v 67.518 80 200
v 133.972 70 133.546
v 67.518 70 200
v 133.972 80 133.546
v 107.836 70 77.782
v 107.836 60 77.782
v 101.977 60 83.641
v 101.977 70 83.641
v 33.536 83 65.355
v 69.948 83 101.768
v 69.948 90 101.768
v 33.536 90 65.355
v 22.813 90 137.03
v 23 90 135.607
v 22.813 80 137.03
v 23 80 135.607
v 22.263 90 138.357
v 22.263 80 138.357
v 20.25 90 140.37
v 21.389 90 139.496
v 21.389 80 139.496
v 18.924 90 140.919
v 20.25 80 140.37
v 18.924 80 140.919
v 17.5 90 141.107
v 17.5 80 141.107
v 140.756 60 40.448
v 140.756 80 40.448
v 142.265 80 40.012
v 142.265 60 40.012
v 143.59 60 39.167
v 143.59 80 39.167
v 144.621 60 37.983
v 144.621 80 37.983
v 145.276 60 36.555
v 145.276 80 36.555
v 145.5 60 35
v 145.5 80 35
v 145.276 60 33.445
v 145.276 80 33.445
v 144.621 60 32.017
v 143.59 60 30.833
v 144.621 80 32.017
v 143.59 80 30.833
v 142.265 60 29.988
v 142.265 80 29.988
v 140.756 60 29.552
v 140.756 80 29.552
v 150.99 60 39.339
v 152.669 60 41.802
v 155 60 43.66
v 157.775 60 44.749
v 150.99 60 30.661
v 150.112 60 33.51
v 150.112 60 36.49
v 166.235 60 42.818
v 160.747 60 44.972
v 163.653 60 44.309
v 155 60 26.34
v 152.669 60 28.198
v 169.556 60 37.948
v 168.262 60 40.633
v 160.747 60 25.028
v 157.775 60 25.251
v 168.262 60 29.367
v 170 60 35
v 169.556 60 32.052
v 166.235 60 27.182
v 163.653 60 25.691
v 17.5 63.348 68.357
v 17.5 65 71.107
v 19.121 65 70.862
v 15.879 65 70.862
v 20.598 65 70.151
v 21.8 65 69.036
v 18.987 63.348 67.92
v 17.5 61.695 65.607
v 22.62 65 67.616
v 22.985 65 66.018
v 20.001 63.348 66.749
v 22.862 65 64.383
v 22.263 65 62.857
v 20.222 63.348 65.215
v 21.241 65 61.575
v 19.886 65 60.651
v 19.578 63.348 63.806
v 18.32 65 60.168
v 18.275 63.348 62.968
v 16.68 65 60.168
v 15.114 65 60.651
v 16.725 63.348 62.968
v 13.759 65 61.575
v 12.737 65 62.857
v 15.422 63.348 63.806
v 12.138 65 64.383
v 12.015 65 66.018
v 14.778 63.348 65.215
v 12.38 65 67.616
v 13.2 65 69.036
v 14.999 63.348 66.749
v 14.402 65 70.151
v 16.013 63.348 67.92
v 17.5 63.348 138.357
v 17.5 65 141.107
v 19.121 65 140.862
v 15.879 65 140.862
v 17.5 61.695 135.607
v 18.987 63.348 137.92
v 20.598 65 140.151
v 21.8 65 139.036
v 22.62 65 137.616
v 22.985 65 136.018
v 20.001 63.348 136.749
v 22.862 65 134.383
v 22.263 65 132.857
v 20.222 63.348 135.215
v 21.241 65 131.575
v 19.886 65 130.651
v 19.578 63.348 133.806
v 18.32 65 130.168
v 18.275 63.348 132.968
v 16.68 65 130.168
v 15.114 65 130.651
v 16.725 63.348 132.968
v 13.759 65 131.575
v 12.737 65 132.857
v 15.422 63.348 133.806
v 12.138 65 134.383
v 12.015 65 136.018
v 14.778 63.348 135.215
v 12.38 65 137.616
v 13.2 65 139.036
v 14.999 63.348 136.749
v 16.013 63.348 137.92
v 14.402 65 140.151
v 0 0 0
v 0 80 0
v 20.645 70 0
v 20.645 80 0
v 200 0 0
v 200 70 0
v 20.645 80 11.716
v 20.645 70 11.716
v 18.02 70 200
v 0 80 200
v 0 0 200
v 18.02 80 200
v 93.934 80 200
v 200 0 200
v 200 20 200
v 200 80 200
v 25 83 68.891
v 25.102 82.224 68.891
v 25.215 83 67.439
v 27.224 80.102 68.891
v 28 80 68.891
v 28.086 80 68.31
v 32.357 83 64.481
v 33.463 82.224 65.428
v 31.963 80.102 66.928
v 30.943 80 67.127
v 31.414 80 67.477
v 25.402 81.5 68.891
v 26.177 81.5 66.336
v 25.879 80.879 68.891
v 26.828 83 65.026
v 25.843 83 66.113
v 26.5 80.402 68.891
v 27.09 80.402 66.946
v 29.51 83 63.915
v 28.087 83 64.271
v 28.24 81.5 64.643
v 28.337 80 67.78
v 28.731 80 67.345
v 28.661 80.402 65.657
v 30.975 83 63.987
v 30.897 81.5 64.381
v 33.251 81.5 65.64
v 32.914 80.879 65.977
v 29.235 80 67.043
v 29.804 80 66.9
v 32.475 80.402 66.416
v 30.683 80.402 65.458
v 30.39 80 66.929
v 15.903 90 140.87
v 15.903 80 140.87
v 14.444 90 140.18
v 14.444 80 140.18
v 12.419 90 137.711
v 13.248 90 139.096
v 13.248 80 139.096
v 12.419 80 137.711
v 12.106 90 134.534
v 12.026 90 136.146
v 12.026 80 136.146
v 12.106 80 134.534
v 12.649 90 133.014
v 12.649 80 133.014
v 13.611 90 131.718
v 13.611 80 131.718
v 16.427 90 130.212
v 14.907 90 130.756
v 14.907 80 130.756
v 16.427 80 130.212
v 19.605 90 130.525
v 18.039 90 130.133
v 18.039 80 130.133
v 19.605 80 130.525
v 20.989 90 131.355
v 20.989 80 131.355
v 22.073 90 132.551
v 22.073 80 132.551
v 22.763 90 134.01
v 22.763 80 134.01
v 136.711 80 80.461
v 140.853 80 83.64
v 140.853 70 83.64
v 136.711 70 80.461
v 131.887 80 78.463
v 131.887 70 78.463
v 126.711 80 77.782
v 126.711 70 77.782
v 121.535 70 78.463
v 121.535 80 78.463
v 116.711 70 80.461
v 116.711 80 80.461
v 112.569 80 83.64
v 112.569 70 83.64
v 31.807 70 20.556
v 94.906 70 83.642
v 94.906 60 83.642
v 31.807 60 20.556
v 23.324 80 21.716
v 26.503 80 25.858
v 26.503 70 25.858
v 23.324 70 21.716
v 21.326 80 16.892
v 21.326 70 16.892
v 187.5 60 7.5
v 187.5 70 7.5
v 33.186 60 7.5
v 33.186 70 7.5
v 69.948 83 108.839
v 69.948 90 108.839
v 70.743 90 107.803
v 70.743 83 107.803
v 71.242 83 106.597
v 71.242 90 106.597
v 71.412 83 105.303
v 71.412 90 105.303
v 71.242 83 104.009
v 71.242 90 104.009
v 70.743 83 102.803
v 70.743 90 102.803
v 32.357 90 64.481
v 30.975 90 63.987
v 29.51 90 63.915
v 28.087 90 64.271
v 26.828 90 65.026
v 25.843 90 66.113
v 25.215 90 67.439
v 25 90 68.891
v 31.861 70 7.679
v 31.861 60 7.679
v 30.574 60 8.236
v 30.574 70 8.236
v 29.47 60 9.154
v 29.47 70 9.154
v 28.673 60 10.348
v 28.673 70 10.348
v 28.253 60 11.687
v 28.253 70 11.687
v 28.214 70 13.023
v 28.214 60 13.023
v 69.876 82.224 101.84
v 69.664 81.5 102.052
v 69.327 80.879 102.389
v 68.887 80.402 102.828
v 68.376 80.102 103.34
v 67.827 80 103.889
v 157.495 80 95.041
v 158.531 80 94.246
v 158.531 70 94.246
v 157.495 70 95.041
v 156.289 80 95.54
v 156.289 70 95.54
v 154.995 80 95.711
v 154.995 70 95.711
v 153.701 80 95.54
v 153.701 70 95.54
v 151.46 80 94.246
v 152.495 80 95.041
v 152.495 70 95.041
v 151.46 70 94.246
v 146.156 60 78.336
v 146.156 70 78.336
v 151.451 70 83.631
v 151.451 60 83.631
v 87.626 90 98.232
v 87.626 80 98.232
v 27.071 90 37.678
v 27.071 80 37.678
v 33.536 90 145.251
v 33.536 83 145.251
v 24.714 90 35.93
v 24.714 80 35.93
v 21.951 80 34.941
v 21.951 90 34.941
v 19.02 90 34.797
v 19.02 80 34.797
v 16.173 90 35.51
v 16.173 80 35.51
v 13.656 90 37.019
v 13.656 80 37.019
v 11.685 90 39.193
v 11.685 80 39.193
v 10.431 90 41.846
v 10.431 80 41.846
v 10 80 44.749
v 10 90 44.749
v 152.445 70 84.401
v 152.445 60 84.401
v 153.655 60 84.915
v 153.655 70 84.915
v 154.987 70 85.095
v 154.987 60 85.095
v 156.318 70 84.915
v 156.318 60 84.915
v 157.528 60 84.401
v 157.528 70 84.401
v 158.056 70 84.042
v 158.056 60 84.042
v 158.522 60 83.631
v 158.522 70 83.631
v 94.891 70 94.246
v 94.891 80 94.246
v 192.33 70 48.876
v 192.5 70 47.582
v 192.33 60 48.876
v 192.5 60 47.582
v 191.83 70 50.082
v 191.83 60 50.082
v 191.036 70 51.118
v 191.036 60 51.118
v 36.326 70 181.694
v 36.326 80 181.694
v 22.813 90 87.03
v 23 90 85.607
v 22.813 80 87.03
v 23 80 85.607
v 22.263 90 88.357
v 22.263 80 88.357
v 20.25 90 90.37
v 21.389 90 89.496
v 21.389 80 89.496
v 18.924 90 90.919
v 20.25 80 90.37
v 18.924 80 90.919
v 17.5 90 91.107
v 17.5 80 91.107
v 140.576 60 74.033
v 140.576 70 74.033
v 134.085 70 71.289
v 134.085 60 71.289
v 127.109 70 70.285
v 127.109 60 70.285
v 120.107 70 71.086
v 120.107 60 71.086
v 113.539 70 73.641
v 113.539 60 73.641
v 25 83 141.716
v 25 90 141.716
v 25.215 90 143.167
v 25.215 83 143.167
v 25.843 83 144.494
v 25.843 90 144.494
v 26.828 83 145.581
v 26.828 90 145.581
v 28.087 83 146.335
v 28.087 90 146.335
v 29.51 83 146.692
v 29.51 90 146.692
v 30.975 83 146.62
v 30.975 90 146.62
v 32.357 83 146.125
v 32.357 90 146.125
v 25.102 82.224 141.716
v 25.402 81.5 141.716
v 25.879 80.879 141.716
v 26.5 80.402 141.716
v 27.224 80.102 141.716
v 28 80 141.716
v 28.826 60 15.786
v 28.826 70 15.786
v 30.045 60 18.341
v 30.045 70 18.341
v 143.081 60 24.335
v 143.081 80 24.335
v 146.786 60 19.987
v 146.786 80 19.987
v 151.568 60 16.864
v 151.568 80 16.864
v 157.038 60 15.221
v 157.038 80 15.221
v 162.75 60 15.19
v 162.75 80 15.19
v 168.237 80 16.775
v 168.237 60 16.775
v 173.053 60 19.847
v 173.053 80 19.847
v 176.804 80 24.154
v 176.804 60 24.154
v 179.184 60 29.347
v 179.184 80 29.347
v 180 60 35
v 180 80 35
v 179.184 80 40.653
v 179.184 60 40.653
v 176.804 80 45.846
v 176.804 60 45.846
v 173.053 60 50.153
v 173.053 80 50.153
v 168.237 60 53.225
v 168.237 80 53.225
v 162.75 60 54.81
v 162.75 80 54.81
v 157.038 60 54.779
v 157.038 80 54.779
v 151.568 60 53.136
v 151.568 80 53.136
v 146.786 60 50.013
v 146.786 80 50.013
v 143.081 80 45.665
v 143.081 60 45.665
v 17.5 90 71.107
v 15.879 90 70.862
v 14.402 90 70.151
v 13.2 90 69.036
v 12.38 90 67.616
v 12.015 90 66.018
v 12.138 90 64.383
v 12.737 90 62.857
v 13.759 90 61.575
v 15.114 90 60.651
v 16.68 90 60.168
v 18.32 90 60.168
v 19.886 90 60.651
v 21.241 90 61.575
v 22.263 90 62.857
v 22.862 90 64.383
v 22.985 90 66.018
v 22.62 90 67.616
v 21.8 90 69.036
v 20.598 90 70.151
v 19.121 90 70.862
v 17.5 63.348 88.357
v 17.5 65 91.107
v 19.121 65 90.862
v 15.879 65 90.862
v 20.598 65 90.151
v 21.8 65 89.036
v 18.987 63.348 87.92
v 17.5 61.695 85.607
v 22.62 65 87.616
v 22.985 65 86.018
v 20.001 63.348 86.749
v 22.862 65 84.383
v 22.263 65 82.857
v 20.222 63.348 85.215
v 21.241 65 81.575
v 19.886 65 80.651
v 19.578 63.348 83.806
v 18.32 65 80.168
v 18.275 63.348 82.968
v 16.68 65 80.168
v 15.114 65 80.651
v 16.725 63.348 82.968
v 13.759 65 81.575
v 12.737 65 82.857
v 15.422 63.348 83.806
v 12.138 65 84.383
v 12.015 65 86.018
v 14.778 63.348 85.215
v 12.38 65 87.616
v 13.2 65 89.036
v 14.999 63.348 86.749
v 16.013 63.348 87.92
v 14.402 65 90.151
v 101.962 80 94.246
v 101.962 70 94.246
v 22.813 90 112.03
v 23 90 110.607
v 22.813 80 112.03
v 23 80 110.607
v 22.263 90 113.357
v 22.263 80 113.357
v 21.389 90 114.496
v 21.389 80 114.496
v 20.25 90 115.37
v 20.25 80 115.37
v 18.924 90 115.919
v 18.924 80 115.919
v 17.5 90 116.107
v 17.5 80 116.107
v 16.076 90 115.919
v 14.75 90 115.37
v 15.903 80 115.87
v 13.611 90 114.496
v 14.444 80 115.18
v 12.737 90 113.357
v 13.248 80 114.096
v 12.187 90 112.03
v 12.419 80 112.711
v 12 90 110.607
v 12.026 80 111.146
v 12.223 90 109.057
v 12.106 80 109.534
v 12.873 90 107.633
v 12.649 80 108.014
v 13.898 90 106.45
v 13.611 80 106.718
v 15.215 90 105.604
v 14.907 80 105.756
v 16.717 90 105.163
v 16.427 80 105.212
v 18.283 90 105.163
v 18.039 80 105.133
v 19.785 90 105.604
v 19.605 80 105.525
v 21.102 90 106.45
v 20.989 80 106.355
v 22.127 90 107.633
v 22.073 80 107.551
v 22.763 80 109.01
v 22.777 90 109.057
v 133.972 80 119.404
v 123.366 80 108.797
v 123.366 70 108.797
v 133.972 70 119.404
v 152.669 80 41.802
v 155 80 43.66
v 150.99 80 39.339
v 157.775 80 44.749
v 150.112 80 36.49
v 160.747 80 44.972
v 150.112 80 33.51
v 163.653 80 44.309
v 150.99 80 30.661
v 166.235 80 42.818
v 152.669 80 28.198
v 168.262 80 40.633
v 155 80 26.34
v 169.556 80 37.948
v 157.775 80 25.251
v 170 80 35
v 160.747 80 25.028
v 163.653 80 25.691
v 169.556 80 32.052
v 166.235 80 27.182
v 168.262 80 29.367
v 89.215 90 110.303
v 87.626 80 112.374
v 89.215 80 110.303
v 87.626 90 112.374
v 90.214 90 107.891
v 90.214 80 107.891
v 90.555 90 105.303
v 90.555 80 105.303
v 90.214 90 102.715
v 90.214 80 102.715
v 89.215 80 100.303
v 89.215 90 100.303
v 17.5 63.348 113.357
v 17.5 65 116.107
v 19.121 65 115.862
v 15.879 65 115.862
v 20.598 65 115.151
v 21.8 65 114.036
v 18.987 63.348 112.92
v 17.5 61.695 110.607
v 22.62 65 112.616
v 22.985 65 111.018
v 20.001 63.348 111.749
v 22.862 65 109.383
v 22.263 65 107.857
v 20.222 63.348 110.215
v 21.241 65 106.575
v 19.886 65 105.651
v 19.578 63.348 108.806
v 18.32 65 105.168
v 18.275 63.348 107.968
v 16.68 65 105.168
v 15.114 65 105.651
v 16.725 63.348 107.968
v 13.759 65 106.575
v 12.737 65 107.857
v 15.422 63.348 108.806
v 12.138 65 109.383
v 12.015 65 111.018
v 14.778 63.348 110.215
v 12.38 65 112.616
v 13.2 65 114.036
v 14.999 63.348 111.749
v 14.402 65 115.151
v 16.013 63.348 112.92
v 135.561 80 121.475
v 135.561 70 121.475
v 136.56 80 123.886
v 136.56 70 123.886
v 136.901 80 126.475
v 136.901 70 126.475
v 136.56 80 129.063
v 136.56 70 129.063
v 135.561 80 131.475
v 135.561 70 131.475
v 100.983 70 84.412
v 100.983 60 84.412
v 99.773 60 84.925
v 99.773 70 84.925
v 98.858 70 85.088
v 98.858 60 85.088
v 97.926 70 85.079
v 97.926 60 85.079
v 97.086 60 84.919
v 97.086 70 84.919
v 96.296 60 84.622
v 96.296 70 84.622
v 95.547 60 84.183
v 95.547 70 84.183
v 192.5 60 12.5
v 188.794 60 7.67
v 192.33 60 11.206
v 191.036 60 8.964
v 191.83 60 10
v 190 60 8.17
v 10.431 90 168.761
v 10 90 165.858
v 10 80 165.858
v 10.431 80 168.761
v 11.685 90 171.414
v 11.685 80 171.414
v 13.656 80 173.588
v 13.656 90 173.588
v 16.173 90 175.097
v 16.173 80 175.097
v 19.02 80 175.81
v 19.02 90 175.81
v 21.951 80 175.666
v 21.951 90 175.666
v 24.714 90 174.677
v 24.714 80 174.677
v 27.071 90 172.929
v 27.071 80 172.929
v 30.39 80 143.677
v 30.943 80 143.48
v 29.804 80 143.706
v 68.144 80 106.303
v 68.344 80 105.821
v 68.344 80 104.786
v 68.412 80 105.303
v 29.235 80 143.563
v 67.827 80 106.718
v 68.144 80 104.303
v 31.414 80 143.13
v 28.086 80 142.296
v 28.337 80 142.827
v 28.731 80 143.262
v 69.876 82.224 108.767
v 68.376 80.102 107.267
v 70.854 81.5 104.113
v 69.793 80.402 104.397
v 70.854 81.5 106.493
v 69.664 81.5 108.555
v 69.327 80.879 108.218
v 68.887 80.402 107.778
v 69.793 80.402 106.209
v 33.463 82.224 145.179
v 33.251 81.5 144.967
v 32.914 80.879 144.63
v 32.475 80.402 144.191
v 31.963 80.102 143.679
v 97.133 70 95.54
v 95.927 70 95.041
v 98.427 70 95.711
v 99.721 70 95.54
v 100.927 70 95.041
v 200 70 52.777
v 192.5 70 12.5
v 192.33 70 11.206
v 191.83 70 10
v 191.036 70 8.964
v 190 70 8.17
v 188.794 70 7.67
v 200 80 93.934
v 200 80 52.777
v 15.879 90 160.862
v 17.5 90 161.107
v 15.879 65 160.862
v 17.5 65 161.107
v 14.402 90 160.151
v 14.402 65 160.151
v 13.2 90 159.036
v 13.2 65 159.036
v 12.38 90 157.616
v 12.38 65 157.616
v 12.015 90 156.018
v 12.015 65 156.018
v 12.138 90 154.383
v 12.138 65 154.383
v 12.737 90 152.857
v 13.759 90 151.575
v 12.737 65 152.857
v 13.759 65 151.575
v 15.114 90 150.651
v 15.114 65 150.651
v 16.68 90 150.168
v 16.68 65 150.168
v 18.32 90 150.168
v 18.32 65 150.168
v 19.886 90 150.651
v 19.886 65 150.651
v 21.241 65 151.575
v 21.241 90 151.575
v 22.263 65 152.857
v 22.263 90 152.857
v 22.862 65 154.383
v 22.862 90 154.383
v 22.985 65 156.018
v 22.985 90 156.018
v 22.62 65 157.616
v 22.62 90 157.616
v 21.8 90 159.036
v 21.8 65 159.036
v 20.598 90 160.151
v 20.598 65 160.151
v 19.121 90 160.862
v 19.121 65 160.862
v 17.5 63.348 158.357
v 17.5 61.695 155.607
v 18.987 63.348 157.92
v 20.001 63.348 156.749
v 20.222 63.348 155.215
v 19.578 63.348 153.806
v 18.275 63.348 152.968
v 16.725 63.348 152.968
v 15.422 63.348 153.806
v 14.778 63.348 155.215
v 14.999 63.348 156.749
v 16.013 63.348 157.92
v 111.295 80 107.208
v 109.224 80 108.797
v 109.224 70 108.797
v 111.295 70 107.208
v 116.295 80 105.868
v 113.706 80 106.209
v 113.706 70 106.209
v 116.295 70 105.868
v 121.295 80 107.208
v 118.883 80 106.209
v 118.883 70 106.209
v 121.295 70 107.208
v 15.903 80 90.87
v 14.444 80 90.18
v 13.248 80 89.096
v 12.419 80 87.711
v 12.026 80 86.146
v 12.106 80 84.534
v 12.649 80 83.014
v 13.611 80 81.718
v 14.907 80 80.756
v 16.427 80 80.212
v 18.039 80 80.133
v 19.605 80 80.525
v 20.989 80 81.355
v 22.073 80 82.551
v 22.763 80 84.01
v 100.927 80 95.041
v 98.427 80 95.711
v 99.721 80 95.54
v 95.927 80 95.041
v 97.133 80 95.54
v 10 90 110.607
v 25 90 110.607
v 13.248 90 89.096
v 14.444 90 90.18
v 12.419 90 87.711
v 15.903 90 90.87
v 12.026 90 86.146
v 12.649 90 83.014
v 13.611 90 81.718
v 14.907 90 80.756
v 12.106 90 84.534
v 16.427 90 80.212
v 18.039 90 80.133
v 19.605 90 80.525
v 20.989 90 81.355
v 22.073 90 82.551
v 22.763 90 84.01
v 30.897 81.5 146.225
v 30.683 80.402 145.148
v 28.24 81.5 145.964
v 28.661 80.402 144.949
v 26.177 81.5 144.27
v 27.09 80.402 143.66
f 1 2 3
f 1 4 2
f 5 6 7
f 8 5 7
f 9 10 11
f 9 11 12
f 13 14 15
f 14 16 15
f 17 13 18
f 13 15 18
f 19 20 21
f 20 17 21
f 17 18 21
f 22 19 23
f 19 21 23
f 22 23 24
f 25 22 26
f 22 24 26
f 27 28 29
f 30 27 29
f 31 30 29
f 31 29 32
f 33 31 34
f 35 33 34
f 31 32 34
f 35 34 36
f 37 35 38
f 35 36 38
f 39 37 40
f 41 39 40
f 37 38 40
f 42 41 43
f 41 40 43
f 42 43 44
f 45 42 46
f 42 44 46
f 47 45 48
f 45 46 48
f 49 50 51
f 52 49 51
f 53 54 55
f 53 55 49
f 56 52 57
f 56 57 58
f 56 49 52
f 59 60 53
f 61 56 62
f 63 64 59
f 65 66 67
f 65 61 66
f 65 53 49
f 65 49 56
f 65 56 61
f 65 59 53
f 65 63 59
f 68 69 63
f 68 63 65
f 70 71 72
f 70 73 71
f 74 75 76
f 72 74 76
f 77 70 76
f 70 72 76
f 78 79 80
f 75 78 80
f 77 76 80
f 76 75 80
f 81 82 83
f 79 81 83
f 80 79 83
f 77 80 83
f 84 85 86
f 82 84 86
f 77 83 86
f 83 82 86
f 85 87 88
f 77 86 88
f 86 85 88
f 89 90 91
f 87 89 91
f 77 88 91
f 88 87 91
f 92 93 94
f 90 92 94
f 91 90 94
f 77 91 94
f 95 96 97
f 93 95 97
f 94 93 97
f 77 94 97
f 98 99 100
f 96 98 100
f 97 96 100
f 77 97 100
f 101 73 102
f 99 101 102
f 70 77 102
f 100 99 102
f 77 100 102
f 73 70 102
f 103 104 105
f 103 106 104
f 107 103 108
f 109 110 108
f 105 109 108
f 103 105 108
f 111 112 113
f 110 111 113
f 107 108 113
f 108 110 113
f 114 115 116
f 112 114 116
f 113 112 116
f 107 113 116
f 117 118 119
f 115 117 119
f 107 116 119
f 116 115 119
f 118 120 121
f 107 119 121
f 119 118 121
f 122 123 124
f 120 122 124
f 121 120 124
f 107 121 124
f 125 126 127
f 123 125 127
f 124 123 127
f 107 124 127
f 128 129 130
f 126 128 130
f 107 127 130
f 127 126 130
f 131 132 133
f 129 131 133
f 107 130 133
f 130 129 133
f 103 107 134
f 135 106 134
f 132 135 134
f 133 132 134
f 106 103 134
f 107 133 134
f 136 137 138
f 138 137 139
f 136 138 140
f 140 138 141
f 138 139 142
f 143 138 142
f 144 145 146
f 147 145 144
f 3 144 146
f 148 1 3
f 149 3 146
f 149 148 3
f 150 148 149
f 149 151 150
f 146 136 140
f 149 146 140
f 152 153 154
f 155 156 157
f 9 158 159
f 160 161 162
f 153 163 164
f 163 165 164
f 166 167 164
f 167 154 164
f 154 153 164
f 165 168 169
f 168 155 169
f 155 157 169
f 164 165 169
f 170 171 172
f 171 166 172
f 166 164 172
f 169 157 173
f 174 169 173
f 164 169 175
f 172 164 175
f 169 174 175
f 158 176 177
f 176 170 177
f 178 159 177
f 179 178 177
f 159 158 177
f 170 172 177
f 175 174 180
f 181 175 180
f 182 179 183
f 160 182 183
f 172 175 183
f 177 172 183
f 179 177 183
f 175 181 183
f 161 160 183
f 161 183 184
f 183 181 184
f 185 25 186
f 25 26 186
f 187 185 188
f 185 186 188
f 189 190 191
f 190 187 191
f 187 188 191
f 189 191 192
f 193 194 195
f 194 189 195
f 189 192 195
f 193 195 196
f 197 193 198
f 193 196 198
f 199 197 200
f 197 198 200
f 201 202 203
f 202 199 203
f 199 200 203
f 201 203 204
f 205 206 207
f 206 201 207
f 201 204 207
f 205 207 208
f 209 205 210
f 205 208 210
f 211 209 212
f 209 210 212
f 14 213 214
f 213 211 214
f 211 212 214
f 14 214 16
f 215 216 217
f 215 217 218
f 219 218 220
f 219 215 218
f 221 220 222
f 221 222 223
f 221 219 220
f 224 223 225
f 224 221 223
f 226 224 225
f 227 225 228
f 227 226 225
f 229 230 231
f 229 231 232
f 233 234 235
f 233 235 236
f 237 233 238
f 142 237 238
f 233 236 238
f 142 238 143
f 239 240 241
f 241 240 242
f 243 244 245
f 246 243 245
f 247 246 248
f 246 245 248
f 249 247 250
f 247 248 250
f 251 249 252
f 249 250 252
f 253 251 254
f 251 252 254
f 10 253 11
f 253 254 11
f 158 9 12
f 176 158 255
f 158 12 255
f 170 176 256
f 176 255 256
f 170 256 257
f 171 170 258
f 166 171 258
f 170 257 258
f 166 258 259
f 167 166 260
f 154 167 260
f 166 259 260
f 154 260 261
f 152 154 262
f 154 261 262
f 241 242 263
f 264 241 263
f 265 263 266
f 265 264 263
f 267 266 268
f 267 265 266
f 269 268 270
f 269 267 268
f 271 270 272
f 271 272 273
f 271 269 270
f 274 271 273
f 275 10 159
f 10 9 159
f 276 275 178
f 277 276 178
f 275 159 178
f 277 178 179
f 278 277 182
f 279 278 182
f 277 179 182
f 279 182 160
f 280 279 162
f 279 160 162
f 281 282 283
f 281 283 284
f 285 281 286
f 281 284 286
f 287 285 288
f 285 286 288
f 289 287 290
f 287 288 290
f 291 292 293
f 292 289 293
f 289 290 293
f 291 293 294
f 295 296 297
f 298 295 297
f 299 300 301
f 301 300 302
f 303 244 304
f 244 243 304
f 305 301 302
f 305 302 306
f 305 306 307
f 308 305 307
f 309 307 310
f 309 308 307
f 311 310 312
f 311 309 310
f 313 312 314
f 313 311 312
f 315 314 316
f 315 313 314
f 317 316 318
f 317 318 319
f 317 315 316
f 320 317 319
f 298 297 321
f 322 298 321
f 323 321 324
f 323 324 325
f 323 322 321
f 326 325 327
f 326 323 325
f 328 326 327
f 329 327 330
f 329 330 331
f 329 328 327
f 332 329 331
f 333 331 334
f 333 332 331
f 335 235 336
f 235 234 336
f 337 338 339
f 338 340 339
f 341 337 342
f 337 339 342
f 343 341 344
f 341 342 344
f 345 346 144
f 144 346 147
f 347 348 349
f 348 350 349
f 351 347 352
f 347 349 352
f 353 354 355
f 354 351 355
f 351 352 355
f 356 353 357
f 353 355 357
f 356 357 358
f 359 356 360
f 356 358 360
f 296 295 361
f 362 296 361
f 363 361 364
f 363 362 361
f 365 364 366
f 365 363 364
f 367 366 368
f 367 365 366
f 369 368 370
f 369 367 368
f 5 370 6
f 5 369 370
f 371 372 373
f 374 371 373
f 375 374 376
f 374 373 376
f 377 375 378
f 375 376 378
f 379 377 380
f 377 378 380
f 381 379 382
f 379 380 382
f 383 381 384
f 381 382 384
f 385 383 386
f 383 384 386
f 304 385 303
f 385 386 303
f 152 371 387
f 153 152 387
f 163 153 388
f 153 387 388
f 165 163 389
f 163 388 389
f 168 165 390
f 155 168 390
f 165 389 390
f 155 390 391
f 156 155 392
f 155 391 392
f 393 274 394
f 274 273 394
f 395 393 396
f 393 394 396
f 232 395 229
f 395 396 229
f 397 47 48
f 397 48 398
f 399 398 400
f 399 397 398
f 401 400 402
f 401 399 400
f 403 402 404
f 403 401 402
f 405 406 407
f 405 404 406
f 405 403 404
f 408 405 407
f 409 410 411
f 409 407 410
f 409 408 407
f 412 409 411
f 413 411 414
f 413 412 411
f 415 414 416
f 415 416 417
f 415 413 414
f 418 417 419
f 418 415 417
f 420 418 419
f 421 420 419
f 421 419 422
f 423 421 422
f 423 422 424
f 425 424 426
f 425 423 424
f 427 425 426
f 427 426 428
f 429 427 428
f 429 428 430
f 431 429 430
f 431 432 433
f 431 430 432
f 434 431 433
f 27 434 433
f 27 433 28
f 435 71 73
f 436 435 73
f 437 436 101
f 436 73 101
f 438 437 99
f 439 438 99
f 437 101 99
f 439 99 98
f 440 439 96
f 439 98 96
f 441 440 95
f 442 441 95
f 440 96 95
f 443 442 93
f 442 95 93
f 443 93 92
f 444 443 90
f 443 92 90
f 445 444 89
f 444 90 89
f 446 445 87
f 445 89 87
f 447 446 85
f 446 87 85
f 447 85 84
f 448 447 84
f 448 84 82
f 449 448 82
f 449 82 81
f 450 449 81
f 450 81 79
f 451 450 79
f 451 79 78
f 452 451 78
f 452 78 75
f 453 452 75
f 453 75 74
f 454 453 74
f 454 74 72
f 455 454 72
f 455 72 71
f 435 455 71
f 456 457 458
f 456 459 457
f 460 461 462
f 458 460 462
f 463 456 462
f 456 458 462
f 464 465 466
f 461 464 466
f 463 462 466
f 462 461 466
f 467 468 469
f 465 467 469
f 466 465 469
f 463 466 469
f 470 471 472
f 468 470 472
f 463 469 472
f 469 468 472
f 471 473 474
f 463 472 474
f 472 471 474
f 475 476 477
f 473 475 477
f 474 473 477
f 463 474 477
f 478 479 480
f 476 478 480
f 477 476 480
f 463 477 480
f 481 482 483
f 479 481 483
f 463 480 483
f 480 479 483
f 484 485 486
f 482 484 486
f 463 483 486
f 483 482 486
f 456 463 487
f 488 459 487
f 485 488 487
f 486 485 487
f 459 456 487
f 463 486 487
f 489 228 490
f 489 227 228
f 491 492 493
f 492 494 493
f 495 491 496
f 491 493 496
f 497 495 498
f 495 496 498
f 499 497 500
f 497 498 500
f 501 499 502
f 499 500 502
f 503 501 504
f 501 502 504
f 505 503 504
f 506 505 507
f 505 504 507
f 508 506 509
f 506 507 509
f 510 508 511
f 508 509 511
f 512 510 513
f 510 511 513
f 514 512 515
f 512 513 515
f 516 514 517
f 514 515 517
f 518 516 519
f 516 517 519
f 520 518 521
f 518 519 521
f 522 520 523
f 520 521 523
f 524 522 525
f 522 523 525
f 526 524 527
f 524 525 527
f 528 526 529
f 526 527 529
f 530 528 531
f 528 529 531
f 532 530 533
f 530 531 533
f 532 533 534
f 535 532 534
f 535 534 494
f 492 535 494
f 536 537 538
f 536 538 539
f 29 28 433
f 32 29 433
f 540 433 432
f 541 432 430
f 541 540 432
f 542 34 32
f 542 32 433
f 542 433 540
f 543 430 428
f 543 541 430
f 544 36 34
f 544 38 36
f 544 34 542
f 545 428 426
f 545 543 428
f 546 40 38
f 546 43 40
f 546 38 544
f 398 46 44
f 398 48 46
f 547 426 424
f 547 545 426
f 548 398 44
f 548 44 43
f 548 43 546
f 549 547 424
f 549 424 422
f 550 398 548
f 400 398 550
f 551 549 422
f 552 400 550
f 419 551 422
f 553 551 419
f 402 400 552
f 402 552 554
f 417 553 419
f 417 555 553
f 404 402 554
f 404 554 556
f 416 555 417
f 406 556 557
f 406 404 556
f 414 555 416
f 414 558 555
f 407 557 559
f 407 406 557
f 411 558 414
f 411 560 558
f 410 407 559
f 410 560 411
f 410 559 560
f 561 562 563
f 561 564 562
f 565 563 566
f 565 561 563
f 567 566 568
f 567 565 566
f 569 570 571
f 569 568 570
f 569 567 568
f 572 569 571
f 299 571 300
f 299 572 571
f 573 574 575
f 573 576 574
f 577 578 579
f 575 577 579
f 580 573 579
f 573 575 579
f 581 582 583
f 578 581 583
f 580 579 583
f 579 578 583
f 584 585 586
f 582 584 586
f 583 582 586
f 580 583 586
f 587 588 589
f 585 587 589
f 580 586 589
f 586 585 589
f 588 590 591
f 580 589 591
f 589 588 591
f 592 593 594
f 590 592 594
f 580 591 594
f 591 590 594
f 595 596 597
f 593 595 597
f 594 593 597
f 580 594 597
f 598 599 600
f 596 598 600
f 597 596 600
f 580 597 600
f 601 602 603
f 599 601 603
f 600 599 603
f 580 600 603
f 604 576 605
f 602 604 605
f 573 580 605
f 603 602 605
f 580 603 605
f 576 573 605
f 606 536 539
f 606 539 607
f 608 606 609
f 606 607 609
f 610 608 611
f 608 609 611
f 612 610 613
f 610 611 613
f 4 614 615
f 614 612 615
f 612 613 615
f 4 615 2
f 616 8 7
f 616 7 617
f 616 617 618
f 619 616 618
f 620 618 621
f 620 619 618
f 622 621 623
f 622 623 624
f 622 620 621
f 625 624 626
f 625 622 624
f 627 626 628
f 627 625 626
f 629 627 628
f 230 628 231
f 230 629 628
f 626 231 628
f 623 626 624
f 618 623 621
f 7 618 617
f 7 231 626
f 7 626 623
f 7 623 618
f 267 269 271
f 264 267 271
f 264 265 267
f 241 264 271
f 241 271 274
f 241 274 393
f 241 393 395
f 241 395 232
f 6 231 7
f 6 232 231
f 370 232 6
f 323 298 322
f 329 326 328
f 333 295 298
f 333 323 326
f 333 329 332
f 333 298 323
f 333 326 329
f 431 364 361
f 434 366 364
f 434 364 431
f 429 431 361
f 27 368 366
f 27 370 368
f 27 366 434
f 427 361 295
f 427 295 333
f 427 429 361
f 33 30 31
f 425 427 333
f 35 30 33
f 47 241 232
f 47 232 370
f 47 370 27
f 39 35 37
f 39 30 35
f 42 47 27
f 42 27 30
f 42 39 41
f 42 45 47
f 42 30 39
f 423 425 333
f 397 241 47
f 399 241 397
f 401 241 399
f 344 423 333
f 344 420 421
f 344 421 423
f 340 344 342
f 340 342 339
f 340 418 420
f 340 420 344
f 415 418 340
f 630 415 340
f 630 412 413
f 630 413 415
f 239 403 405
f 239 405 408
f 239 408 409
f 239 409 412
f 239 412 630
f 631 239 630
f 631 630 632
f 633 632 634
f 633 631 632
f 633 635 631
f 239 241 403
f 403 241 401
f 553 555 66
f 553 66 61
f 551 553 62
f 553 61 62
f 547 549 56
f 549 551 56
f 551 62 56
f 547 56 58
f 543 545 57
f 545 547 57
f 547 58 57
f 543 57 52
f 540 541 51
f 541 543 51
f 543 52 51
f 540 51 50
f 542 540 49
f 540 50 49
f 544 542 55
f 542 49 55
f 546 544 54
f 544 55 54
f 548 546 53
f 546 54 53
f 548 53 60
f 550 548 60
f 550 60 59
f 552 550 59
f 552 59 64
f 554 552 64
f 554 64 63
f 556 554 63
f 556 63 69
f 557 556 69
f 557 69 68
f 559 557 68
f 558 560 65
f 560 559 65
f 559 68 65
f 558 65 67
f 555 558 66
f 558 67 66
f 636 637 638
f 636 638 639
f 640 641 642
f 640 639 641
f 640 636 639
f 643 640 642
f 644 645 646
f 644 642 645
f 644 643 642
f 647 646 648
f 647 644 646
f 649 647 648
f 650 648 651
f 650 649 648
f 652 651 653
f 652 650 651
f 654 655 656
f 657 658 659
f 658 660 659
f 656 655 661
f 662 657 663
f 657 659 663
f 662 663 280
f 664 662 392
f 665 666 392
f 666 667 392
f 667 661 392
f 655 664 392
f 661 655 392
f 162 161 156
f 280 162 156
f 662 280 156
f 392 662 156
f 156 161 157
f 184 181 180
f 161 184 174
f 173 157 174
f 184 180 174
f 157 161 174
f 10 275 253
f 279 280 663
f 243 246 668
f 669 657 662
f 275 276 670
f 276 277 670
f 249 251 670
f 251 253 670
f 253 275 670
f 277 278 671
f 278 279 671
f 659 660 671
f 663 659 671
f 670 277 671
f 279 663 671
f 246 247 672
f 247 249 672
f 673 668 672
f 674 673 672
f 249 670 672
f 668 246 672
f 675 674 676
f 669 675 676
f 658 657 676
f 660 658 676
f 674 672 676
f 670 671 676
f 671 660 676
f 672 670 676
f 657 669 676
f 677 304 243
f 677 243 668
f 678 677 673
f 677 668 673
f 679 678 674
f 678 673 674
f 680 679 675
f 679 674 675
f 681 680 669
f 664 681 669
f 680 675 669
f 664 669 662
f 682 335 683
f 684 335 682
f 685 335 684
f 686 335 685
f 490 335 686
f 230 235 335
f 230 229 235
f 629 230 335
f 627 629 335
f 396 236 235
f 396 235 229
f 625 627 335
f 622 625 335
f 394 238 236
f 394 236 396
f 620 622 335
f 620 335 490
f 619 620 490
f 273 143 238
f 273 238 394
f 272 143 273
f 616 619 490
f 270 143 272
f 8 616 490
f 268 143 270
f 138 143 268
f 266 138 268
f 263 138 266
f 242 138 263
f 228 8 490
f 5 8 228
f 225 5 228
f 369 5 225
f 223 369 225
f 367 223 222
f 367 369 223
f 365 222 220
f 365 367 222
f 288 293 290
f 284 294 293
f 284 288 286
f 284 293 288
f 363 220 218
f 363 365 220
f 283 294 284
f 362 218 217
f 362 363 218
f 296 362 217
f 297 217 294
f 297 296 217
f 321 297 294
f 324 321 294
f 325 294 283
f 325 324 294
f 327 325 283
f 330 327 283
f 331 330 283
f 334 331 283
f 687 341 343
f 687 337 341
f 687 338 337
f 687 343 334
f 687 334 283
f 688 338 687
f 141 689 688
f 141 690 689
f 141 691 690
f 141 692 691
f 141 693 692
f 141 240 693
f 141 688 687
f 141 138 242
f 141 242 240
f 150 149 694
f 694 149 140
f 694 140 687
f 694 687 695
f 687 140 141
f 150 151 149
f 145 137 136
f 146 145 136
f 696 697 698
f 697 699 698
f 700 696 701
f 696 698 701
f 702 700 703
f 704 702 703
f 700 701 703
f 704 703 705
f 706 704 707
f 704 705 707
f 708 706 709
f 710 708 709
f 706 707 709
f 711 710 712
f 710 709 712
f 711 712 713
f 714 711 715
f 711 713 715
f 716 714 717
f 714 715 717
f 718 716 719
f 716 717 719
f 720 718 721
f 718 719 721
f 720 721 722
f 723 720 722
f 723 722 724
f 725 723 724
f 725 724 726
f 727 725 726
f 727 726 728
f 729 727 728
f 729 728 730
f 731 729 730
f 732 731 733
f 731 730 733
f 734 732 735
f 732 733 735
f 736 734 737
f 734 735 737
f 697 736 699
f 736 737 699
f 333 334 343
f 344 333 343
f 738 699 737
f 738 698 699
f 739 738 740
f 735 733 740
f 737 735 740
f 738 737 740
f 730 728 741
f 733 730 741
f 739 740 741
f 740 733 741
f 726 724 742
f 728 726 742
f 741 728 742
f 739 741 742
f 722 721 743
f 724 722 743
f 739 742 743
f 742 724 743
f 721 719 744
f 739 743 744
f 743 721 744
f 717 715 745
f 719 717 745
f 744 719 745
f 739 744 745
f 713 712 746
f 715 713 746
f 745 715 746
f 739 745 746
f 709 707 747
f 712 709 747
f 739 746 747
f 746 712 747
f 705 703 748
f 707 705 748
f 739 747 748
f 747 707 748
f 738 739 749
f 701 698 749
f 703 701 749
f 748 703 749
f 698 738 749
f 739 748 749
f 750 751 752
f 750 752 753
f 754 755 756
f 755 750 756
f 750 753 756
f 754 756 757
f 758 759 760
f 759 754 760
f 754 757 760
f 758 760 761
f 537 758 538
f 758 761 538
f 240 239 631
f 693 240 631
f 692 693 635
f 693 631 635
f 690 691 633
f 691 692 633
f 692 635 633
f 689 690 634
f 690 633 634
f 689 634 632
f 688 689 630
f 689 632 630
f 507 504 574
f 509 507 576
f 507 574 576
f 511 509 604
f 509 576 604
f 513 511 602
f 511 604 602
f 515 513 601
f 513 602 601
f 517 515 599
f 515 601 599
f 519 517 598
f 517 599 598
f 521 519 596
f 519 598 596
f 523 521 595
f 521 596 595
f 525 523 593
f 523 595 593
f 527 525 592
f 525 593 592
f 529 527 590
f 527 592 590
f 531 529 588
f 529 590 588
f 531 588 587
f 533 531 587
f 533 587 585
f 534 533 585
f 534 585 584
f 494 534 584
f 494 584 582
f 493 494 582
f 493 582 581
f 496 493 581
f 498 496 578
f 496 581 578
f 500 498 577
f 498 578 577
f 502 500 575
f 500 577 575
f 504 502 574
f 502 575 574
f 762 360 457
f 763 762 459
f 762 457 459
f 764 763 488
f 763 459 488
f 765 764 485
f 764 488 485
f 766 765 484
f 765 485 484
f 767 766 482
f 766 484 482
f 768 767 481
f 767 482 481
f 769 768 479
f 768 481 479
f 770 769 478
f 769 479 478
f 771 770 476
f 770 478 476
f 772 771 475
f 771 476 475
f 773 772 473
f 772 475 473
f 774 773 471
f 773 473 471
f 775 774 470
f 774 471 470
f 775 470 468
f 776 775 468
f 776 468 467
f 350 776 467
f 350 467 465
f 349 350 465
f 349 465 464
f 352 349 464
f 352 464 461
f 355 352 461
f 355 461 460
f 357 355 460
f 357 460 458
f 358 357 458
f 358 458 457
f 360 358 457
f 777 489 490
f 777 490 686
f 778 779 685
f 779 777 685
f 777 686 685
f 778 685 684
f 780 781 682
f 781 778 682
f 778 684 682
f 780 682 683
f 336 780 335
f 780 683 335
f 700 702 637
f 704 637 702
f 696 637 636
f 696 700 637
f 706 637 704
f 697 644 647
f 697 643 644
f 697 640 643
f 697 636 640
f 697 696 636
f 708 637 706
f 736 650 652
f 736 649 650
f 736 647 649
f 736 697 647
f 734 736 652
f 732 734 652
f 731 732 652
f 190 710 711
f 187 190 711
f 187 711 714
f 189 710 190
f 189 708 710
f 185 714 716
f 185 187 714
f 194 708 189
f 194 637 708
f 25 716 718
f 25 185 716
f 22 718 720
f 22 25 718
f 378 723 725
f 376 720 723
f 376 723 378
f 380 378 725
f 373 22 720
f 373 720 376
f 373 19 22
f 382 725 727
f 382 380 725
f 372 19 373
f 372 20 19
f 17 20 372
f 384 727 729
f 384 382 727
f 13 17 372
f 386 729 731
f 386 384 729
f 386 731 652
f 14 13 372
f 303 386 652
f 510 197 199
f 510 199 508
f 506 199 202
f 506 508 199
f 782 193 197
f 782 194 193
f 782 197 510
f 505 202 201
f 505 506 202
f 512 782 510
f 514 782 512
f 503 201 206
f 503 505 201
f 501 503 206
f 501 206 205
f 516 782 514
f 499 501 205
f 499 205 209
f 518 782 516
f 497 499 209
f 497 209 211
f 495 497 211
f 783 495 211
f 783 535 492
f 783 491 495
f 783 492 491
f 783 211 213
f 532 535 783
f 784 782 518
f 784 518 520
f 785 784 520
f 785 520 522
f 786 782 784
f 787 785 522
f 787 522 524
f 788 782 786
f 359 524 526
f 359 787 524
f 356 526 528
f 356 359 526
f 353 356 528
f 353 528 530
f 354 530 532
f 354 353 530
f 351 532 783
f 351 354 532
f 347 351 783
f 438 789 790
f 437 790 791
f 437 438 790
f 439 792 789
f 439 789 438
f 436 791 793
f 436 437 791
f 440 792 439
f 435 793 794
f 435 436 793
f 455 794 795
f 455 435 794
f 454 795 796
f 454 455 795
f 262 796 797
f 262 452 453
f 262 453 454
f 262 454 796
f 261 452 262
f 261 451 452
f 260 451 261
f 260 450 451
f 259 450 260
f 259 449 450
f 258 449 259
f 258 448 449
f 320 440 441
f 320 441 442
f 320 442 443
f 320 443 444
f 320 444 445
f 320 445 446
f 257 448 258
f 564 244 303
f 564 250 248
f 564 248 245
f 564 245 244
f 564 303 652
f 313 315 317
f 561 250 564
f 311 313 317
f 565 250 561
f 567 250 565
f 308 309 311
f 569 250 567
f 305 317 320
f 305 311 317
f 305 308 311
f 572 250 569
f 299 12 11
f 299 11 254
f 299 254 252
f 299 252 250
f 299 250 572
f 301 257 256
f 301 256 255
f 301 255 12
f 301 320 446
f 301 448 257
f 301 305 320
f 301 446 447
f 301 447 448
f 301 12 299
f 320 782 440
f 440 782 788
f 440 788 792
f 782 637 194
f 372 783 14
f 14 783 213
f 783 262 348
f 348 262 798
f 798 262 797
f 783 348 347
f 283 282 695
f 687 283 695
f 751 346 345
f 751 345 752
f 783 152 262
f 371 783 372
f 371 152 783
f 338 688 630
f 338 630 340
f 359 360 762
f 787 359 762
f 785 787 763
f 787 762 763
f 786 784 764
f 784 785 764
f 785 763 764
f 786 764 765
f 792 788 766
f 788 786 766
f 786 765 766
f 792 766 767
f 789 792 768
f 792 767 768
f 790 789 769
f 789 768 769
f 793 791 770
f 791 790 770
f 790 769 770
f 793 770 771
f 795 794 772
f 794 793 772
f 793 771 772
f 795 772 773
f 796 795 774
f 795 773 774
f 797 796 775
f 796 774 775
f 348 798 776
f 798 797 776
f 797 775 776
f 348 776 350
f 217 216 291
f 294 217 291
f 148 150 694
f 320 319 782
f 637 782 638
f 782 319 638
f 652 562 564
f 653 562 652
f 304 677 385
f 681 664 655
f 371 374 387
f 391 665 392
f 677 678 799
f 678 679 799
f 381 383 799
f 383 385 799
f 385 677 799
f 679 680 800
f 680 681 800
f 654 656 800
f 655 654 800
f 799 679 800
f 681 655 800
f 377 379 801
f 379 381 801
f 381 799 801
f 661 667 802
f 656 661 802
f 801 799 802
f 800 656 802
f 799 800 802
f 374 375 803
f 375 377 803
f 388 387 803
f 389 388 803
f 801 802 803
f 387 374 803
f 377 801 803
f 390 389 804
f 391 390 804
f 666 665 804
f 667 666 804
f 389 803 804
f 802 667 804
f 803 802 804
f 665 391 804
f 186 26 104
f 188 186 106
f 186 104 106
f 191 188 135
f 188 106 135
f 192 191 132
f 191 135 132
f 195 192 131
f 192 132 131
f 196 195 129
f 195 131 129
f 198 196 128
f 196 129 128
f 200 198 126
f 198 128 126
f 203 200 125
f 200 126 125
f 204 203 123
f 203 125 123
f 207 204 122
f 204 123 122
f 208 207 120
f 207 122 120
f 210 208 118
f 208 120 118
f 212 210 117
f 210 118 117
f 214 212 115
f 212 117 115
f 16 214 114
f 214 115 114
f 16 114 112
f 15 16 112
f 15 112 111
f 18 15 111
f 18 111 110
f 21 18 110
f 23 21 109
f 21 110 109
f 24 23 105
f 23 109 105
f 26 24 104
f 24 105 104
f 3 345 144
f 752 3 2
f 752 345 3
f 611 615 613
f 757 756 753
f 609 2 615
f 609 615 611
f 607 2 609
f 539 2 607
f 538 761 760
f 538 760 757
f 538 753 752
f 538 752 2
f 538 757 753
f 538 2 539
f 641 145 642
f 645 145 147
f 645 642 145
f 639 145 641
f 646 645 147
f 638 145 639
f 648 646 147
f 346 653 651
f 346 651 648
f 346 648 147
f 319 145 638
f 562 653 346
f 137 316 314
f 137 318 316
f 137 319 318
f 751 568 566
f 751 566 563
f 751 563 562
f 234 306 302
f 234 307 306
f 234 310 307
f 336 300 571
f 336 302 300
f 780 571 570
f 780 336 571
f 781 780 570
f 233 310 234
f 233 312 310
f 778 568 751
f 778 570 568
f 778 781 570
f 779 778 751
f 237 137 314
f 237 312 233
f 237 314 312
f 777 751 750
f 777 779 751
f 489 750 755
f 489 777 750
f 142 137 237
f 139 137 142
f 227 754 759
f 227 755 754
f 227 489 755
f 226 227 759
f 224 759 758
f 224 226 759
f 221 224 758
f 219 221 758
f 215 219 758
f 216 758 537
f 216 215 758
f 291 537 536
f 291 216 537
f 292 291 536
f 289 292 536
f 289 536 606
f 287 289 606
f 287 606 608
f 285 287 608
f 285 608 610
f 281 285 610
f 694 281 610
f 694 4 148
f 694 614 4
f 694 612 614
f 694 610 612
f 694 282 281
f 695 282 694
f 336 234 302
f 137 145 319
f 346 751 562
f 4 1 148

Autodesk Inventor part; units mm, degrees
ref_plane "YZ Plane" through (0, 0, 0) normal (1, 0, 0) x (0, 1, 0)
ref_plane "XZ Plane" through (0, 0, 0) normal (0, 1, 0) x (-1, 0, 0)
sketch "Sketch1" plane through (0, 0, 0) normal (0, 0, 1) x (1, 0, 0)
  line L0 (0, 0) -> (200, 0)
  line L1 (200, 0) -> (200, 80)
  line L2 (200, 80) -> (0, 80)
  line L3 (0, 80) -> (0, 0)
  dimension "d0" = 200
  dimension "d1" = 80
extrude "Extrusion1" add sketch "Sketch1" along normal blind 200
sketch "Sketch2" plane through (0, 80, 0) normal (0, 1, 0) x (1, 0, 0)
  line L0 (0, 0) -> (200, 0) projected
  line L1 (0, 0) -> (0, -200) projected
  line L2 (10, -20.6066) -> (10, -190)
  line L3 (20.6066, -10) -> (190, -10)
  line L4 (10, -20.6066) -> (10, -25)
  line L5 (20.6066, -10) -> (25, -10)
  line L6 (105.3033, -94.6967) -> (20.6066, -10)
  line L7 (94.6967, -105.3033) -> (10, -20.6066)
  line L8 (190, -10) -> (105.3033, -94.6967)
  line L9 (94.6967, -105.3033) -> (10, -190)
  line L10 (105.3033, -73.4835) -> (153.7868, -25)
  line L11 (94.6967, -105.3033) -> (84.0901, -115.9099)
  line L12 (73.4835, -105.3033) -> (25, -56.8198)
  line L13 (105.3033, -73.4835) -> (56.8198, -25)
  line L14 (153.7868, -25) -> (56.8198, -25)
  line L15 (25, -56.8198) -> (25, -153.7868)
  line L16 (134.3503, -134.3503) -> (91.9239, -176.7767)
  line L17 (63.6396, -148.4924) -> (148.4924, -63.6396)
  line L18 (176.7767, -91.9239) -> (134.3503, -134.3503)
  arc A0 (176.7767, -91.9239) -> (148.4924, -63.6396) centre (162.6346, -77.7817) ccw
  arc A1 (169.7056, -84.8528) -> (155.5635, -70.7107) centre (162.6346, -77.7817) ccw
  line L19 (169.7056, -84.8528) -> (97.1003, -157.4582)
  line L20 (155.5635, -70.7107) -> (82.9581, -143.316)
  line L21 (73.4835, -105.3033) -> (25, -153.7868)
  line L22 (10, -110.6066) -> (25, -110.6066)
  circle A2 centre (17.5, -110.6066) radius 5.5
  circle A3 centre (17.5, -135.6066) radius 5.5
  circle A4 centre (17.5, -85.6066) radius 5.5
  circle A5 centre (17.5, -65.6066) radius 3.5
  circle A6 centre (17.5, -155.6066) radius 3.5
  arc A7 (63.6396, -148.4924) -> (91.9239, -176.7767) centre (77.7817, -162.6346) ccw
  arc A8 (97.1003, -157.4582) -> (82.9581, -143.316) centre (77.7817, -162.6346) ccw
  dimension "d20" = 40
  dimension "d22" = 11
  dimension "d24" = 11
  dimension "d26" = 11
  dimension "d29" = 7
  dimension "d30" = 7
extrude "Extrusion2" add sketch "Sketch2" along normal blind 10
ref_plane "Work Plane1" through (0, 80, 0) normal (-0.7071, 0, 0.7071) x (0, -1, 0)
sketch "Sketch3" plane through (0, 80, 0) normal (-0.7071, 0, 0.7071) x (0, -1, 0)
  line L0 (80, 282.8427) -> (0, 282.8427) projected
  line L1 (0, 282.8427) -> (0, 207.8427)
  line L2 (0, 141.4214) -> (0, 282.8427) projected
  line L3 (0, 282.8427) -> (60, 282.8427)
  line L4 (60, 282.8427) -> (0, 207.8427)
  point P0 (80, 0)
  dimension "d33" = 75
  dimension "d34" = 60
extrude "Extrusion3" cut sketch "Sketch3" along normal mid plane 200
fillet "Fillet1" radius 5 3 edges at (25, 85, 56.8198) (73.4835, 85, 105.3033) (25, 85, 153.7868)
sketch "Sketch5" plane through (0, 90, 0) normal (0, 1, 0) x (1, 0, 0)
  point P0 (0, 0)
sketch "Sketch6" plane through (0, 90, 0) normal (0, 1, 0) x (1, 0, 0)
  arc A0 (63.6396, -148.4924) -> (91.9239, -176.7767) centre (77.7817, -162.6346) ccw projected
  arc A1 (63.6396, -148.4924) -> (91.9239, -176.7767) centre (77.7817, -162.6346) ccw
  arc A2 (169.7056, -84.8528) -> (155.5635, -70.7107) centre (162.6346, -77.7817) ccw projected
  arc A3 (176.7767, -91.9239) -> (148.4924, -63.6396) centre (162.6346, -77.7817) ccw
  line L0 (148.4924, -63.6396) -> (63.6396, -148.4924) projected
  line L1 (63.6396, -148.4924) -> (148.4924, -63.6396)
  line L2 (91.9239, -176.7767) -> (176.7767, -91.9239) projected
  line L3 (91.9239, -176.7767) -> (176.7767, -91.9239)
  point P0 (0, 0)
extrude "Extrusion5" cut sketch "Sketch6" against normal blind 10
sketch "Sketch7" plane through (0, 90, 0) normal (0, 1, 0) x (1, 0, 0)
  line L0 (105.3033, -94.6967) -> (20.6066, -10) projected
  line L1 (20.6066, -10) -> (105.3033, -94.6967)
  line L2 (190, -10) -> (105.3033, -94.6967) projected
  line L3 (105.3033, -94.6967) -> (190, -10)
  line L4 (190, -10) -> (20.6066, -10)
  point P0 (0, 0)
extrude "Extrusion6" cut sketch "Sketch7" against normal blind 10
sketch "Sketch8" plane through (0, 80, 0) normal (0, 1, 0) x (1, 0, 0)
  line L0 (200, 0) -> (0, 0) projected
  line L1 (0, 0) -> (20.645, 0)
  line L2 (20.645, 0) -> (20.645, -20)
  line L3 (20.645, -20) -> (126.7111, -126.066)
  line L4 (20.645, -20) -> (170.645, -20) construction
  line L5 (126.7111, -126.066) -> (200, -52.7771)
  line L6 (200, 0) -> (200, -93.934) projected
  line L7 (20.645, 0) -> (200, 0)
  line L8 (200, -52.7771) -> (200, 0)
  dimension "d45" = 20
  dimension "d46" = 150
  dimension "d47" = 45
extrude "Extrusion7" cut sketch "Sketch8" against normal blind 10
fillet "Fillet2" radius 20 2 edges at (126.7111, 75, 126.066) (20.645, 75, 20)
sketch "Sketch9" plane through (0, 70, 0) normal (0, 1, 0) x (1, 0, 0)
  arc A0 (112.5689, -111.9239) -> (140.8532, -111.9239) centre (126.7111, -97.7817) ccw projected
  arc A1 (117.4902, -106.2213) -> (135.9319, -106.2213) centre (126.7111, -97.7817) ccw
  arc A2 (20.645, -11.7157) -> (26.5029, -25.8579) centre (40.645, -11.7157) ccw projected
  arc A3 (28.145, -11.7157) -> (31.8071, -20.5555) centre (40.645, -11.7157) ccw
  line L0 (117.4902, -106.2213) -> (31.8071, -20.5555)
  line L1 (135.9319, -106.2213) -> (226.547, -106.2213) construction
  line L2 (200, 0) -> (200, -52.7771) projected
  line L3 (200, 0) -> (192.5, 0)
  line L4 (20.645, 0) -> (200, 0) projected
  line L5 (192.5, -7.5) -> (192.5, -49.6532)
  line L6 (200, 0) -> (200, -7.5)
  line L7 (192.5, -7.5) -> (28.145, -7.5)
  line L8 (28.145, -11.7157) -> (28.145, -7.5)
  line L9 (135.9319, -106.2213) -> (192.5, -49.6532)
  line L10 (200, -42.1532) -> (200.0065, -42.1467)
  line L11 (126.7111, -97.7817) -> (126.7111, -85.2817)
  circle A4 centre (126.7111, -97.7817) radius 12.5
  point P0 (0, 0)
  dimension "d51" = 25
  dimension "d52" = 25
  dimension "d54" = 7.5
  dimension "d55" = 7.5
extrude "Extrusion8" cut sketch "Sketch9" against normal blind 10 contours L0 A3 L8 L7 L5 L9 A4
sketch "Sketch10" plane through (0, 70, 0) normal (0, 1, 0) x (1, 0, 0)
  arc A0 (135.9319, -106.2213) -> (117.4902, -106.2213) centre (126.7111, -97.7817) ccw projected
  circle A1 centre (126.7111, -97.7817) radius 20
  point P0 (0, 0)
extrude "Extrusion9" add sketch "Sketch10" along normal blind 10 and the other way blind 10
sketch "Sketch11" plane through (0, 80, 200) normal (0, 1, 0) x (1, 0, 0)
  arc A0 (146.5879, 104.4347) -> (106.834, 104.4327) centre (126.7111, 102.2183) ccw projected
  line L0 (126.7111, 102.2183) -> (112.5689, 116.3604)
  line L1 (126.7111, 102.2183) -> (146.7111, 102.2183) construction
  line L2 (112.5689, 116.3604) -> (98.4268, 102.2183)
  line L3 (112.5689, 88.0761) -> (26.5029, 174.1421) projected
  line L4 (140.8532, 116.3604) -> (154.9953, 102.2183)
  line L5 (200, 147.2229) -> (140.8532, 88.0761) projected
  arc A1 (112.5689, 88.0761) -> (140.8532, 88.0761) centre (126.7111, 102.2183) ccw
  arc A2 (140.8532, 116.3604) -> (112.5689, 116.3604) centre (126.7111, 102.2183) ccw
  line L6 (112.5689, 88.0761) -> (98.4268, 102.2183)
  line L7 (154.9953, 102.2183) -> (140.8532, 88.0761)
  point P0 (0, 200)
  dimension "d62" = 135
extrude "Extrusion10" add sketch "Sketch11" against normal blind 20
fillet "Fillet3" radius 10 2 edges at (103.7373, 65, 92.4712) (149.6834, 65, 92.4698)
sketch "Sketch12" plane through (0, 70, 0) normal (0, 1, 0) x (1, 0, 0)
  arc A0 (140.8532, -83.6396) -> (112.5689, -83.6396) centre (126.7111, -97.7817) ccw projected
  line L0 (107.8365, -77.7817) -> (93.1316, -92.4866)
  line L1 (98.4268, -97.7817) -> (26.5029, -25.8579) projected
  line L2 (146.1565, -78.3363) -> (160.2986, -92.4784)
  line L3 (200, -52.7771) -> (154.9953, -97.7817) projected
  line L4 (160.2986, -92.4784) -> (127.5069, -125.2702)
  line L5 (127.5069, -125.2702) -> (93.9274, -91.6908)
  arc A1 (146.1565, -78.3363) -> (106.7111, -78.9072) centre (126.7111, -97.7817) ccw
  point P0 (0, 0)
extrude "Extrusion11" add sketch "Sketch12" against normal blind 20 contours A1 L2 L3 L4 L5 L0
fillet "Fillet4" radius 5 2 edges at (98.6681, 65, 86.9501) (154.7622, 65, 86.942)
fillet "Fillet5" radius 5 2 edges at (98.4268, 75, 97.7817) (154.9953, 75, 97.7817)
fillet "Fillet6" radius 5 3 edges at (192.5, 65, 7.5) (192.5, 65, 49.6532) (28.145, 65, 7.5)
sketch "Sketch13" plane through (0, 60, 0) normal (0, 1, 0) x (1, 0, 0)
  line L0 (200, 0) -> (200, -52.7771) projected
  line L1 (200, 0) -> (200, -35)
  line L2 (200, -35) -> (160, -35)
  circle A0 centre (160, -35) radius 20
  circle A1 centre (160, -35) radius 10
  point P0 (0, 0)
  dimension "d72" = 35
  dimension "d73" = 40
  dimension "d74" = 40
  dimension "d75" = 20
extrude "Extrusion12" add sketch "Sketch13" along normal blind 20
fillet "Fillet7" radius 10 3 edges at (94.6967, 85, 105.3033) (10, 85, 20.6066) (10, 85, 190)
fillet "Fillet8" radius 3 6 edges at (28.0866, 80, 146.3351) (51.7417, 80, 127.045) (71.4124, 80, 105.3033) (51.7417, 80, 83.5616) (28.0866, 80, 64.2715) (25, 80, 105.3033)
sketch "Sketch14" plane through (160, 80, 35) normal (0, 1, 0) x (1, 0, 0)
  circle A0 centre (0, 0) radius 20 projected
  circle A1 centre (-20, 0) radius 5.5
  point P0 (-160, 35)
  dimension "d80" = 11
extrude "Extrusion13" cut sketch "Sketch14" against normal blind 20 contours A1 A0 | A0 A1 picked at (-18.1103, 0) picked at (-21.777, 0)
sketch "Sketch15" plane through (0, 80, 200) normal (0, 1, 0) x (1, 0, 0)
  line L0 (87.6256, 87.6256) -> (27.0711, 27.0711) projected
  line L1 (27.0711, 27.0711) -> (87.6256, 87.6256)
  line L2 (87.6256, 87.6256) -> (27.0711, 27.0711)
  line L3 (36.3259, 18.3055) -> (116.2946, 98.2741)
  line L4 (116.2946, 98.2741) -> (18.0204, 0)
  line L5 (116.2946, 98.2741) -> (141.0433, 73.5254)
  line L6 (141.0433, 73.5254) -> (67.5179, 0)
  line L7 (93.934, 0) -> (0, 0) projected
  line L8 (67.5179, 0) -> (18.0204, 0)
  point P0 (0, 200)
  dimension "d83" = 35
extrude "Extrusion14" cut sketch "Sketch15" against normal blind 10
fillet "Fillet9" radius 10 2 edges at (116.2946, 75, 101.7259) (141.0433, 75, 126.4746)
sketch "Sketch17" plane through (0, 90, 0) normal (0, 1, 0) x (1, 0, 0)
  circle A0 centre (17.5, -110.6066) radius 5.5 projected
  circle A1 centre (17.5, -110.6066) radius 5.5
  circle A2 centre (17.5, -135.6066) radius 5.5 projected
  circle A3 centre (17.5, -135.6066) radius 5.5
  circle A4 centre (17.5, -85.6066) radius 5.5 projected
  circle A5 centre (17.5, -85.6066) radius 5.5
  circle A6 centre (17.5, -65.6066) radius 3.5 projected
  circle A7 centre (17.5, -65.6066) radius 3.5
  circle A8 centre (17.5, -155.6066) radius 3.5 projected
  circle A9 centre (17.5, -155.6066) radius 3.5
  point P0 (0, 0)
hole "Hole1" at (17.5, 90, 85.6066) at (17.5, 90, 110.6066) at (17.5, 90, 135.6066) direction (0, -1, 0) diameter 11 depth 25 tip angle 118
sketch "Sketch18" plane through (0, 90, 0) normal (0, 1, 0) x (1, 0, 0)
  circle A0 centre (17.5, -65.6066) radius 3.5 projected
  circle A1 centre (17.5, -65.6066) radius 3.5
  circle A2 centre (17.5, -155.6066) radius 3.5 projected
  circle A3 centre (17.5, -155.6066) radius 3.5
  point P0 (0, 0)
hole "Hole2" at (17.5, 90, 65.6066) at (17.5, 90, 155.6066) direction (0, -1, 0) diameter 11 depth 25 tip angle 118
thread "Thread1" size "M11x1.5" class "6H" standard "ANSI Metric M Profile" length 15
thread "Thread2" size "M11x1.5" class "6H" standard "ANSI Metric M Profile" length 15
thread "Thread3" size "M11x1.5" class "6H" standard "ANSI Metric M Profile" length 15
properties part number "proyecto"
